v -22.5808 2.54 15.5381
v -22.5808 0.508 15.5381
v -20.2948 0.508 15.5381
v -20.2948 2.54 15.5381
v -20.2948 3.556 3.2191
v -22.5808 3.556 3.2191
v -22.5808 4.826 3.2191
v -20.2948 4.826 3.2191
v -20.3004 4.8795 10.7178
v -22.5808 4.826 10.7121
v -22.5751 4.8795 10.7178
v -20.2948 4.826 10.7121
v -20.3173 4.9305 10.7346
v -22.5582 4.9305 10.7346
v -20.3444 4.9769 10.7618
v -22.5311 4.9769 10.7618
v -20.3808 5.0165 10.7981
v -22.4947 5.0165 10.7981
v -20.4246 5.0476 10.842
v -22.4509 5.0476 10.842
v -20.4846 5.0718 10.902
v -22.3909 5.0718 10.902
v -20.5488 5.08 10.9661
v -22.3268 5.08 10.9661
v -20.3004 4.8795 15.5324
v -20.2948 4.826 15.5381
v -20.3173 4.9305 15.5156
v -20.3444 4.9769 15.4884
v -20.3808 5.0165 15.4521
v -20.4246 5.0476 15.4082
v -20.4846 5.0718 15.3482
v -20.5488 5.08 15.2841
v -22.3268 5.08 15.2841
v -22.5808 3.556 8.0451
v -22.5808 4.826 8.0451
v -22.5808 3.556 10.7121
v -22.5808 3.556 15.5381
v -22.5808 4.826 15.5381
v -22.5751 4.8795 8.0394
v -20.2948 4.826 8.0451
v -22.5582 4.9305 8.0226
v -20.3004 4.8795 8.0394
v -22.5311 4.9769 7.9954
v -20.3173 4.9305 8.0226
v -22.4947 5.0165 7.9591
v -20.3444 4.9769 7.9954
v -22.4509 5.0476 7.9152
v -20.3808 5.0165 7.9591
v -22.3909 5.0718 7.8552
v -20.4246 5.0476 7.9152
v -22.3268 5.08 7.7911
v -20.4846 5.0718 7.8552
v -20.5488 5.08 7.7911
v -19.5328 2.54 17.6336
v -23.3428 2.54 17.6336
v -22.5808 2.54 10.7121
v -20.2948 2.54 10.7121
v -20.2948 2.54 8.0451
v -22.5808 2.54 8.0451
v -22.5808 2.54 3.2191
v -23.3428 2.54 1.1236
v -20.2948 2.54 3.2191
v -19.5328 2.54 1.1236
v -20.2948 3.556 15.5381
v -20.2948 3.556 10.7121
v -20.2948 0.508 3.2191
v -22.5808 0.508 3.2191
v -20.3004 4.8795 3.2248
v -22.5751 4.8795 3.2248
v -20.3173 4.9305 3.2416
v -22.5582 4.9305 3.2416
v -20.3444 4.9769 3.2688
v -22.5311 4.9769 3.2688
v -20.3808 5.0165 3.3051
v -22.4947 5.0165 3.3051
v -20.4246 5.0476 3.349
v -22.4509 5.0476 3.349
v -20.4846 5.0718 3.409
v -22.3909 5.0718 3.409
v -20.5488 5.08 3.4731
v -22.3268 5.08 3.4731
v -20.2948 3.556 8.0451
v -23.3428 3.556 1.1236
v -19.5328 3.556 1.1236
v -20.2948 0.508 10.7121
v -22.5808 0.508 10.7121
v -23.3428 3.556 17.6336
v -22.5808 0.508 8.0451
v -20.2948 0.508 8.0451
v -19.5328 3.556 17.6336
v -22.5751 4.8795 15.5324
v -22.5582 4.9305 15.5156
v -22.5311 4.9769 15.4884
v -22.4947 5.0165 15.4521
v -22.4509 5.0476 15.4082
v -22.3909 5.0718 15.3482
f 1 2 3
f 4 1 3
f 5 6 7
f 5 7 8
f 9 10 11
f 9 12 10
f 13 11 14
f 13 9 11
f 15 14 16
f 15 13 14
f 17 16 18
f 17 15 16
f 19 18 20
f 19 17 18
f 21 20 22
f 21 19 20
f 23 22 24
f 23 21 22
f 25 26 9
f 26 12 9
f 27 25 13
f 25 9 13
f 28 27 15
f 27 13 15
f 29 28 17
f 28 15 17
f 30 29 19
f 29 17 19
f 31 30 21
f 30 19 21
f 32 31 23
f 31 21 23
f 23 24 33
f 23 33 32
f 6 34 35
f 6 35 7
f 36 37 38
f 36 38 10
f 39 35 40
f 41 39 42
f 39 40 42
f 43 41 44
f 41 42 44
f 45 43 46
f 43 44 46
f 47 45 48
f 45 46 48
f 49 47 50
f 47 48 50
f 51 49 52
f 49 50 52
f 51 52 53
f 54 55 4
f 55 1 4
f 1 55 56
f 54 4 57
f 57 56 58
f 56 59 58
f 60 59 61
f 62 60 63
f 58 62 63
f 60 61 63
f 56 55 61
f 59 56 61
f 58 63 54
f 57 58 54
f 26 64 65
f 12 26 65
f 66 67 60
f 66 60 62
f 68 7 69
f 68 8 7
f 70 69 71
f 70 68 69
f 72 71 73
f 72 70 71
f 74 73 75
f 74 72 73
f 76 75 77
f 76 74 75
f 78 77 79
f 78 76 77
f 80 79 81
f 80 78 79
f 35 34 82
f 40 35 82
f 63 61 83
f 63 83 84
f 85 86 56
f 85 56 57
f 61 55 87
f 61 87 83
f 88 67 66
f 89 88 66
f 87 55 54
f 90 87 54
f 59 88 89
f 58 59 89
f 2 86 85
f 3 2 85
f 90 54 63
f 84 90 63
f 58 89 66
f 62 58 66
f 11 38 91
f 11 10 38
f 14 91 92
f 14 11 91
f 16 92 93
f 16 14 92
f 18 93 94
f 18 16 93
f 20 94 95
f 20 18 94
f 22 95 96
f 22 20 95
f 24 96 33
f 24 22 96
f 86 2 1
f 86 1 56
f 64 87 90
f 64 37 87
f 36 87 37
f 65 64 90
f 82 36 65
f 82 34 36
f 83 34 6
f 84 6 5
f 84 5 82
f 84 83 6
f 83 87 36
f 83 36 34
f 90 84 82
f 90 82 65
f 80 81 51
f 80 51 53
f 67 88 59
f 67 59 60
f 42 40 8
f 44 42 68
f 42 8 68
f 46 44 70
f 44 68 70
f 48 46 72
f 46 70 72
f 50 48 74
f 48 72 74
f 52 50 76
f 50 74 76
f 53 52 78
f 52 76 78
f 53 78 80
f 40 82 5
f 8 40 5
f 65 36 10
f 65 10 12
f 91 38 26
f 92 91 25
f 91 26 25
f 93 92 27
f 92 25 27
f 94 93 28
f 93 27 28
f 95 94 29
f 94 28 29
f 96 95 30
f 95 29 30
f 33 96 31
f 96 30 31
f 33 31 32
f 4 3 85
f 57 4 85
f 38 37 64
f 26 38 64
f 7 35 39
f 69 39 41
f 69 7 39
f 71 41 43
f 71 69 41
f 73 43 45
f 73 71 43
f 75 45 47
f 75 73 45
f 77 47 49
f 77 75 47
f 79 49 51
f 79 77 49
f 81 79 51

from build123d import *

# Parameters (mm, degrees)
BOSS_EXTRUDE1_DEPTH      = 0.508
BOSS_EXTRUDE1_DEPTH_BACK = 0.508
SKETCH1_W                = 3.81
SKETCH1_H                = 16.51
BOSS_EXTRUDE2_DEPTH      = 2.032
BOSS_EXTRUDE2_DEPTH_BACK = 2.54
SKETCH1_3_W              = 2.286
SKETCH1_3_H              = 4.826
FILLET1_R                = 0.254


with BuildPart() as part:
    # Sketch1 → Boss-Extrude1 (new, two sides: drawn at the far end of the back side and taken through both)
    with BuildSketch(Plane(origin=(0, 3.048, 0), x_dir=(1, 0, 0), z_dir=(0, 1, 0)).offset(-BOSS_EXTRUDE1_DEPTH_BACK)):
        with Locations((-21.437752693, -9.378592753)):
            Rectangle(SKETCH1_W, SKETCH1_H)
    extrude(amount=BOSS_EXTRUDE1_DEPTH + BOSS_EXTRUDE1_DEPTH_BACK)

    # Sketch1<3> → Boss-Extrude2 (add, two sides: drawn at the far end of the back side and taken through both)
    with BuildSketch(Plane(origin=(0, 3.048, 0), x_dir=(1, 0, 0), z_dir=(0, 1, 0)).offset(-BOSS_EXTRUDE2_DEPTH_BACK)):
        with Locations((-21.437752693, -5.632092753)):
            Rectangle(SKETCH1_3_W, SKETCH1_3_H)
        with Locations((-21.437752693, -13.125092753)):
            Rectangle(SKETCH1_3_W, SKETCH1_3_H)
    extrude(amount=BOSS_EXTRUDE2_DEPTH + BOSS_EXTRUDE2_DEPTH_BACK)

    # Fillet1
    fillet1_edges = [part.edges().sort_by_distance(p)[0] for p in [
        (-21.437752693, 5.08, 10.712092753),
        (-20.294752693, 5.08, 13.125092753),
        (-22.580752693, 5.08, 13.125092753),
        (-21.437752693, 5.08, 15.538092753),
        (-21.437752693, 5.08, 3.219092753),
        (-20.294752693, 5.08, 5.632092753),
        (-22.580752693, 5.08, 5.632092753),
        (-21.437752693, 5.08, 8.045092753),
    ]]
    fillet(fillet1_edges, radius=FILLET1_R)


solid = part.part
